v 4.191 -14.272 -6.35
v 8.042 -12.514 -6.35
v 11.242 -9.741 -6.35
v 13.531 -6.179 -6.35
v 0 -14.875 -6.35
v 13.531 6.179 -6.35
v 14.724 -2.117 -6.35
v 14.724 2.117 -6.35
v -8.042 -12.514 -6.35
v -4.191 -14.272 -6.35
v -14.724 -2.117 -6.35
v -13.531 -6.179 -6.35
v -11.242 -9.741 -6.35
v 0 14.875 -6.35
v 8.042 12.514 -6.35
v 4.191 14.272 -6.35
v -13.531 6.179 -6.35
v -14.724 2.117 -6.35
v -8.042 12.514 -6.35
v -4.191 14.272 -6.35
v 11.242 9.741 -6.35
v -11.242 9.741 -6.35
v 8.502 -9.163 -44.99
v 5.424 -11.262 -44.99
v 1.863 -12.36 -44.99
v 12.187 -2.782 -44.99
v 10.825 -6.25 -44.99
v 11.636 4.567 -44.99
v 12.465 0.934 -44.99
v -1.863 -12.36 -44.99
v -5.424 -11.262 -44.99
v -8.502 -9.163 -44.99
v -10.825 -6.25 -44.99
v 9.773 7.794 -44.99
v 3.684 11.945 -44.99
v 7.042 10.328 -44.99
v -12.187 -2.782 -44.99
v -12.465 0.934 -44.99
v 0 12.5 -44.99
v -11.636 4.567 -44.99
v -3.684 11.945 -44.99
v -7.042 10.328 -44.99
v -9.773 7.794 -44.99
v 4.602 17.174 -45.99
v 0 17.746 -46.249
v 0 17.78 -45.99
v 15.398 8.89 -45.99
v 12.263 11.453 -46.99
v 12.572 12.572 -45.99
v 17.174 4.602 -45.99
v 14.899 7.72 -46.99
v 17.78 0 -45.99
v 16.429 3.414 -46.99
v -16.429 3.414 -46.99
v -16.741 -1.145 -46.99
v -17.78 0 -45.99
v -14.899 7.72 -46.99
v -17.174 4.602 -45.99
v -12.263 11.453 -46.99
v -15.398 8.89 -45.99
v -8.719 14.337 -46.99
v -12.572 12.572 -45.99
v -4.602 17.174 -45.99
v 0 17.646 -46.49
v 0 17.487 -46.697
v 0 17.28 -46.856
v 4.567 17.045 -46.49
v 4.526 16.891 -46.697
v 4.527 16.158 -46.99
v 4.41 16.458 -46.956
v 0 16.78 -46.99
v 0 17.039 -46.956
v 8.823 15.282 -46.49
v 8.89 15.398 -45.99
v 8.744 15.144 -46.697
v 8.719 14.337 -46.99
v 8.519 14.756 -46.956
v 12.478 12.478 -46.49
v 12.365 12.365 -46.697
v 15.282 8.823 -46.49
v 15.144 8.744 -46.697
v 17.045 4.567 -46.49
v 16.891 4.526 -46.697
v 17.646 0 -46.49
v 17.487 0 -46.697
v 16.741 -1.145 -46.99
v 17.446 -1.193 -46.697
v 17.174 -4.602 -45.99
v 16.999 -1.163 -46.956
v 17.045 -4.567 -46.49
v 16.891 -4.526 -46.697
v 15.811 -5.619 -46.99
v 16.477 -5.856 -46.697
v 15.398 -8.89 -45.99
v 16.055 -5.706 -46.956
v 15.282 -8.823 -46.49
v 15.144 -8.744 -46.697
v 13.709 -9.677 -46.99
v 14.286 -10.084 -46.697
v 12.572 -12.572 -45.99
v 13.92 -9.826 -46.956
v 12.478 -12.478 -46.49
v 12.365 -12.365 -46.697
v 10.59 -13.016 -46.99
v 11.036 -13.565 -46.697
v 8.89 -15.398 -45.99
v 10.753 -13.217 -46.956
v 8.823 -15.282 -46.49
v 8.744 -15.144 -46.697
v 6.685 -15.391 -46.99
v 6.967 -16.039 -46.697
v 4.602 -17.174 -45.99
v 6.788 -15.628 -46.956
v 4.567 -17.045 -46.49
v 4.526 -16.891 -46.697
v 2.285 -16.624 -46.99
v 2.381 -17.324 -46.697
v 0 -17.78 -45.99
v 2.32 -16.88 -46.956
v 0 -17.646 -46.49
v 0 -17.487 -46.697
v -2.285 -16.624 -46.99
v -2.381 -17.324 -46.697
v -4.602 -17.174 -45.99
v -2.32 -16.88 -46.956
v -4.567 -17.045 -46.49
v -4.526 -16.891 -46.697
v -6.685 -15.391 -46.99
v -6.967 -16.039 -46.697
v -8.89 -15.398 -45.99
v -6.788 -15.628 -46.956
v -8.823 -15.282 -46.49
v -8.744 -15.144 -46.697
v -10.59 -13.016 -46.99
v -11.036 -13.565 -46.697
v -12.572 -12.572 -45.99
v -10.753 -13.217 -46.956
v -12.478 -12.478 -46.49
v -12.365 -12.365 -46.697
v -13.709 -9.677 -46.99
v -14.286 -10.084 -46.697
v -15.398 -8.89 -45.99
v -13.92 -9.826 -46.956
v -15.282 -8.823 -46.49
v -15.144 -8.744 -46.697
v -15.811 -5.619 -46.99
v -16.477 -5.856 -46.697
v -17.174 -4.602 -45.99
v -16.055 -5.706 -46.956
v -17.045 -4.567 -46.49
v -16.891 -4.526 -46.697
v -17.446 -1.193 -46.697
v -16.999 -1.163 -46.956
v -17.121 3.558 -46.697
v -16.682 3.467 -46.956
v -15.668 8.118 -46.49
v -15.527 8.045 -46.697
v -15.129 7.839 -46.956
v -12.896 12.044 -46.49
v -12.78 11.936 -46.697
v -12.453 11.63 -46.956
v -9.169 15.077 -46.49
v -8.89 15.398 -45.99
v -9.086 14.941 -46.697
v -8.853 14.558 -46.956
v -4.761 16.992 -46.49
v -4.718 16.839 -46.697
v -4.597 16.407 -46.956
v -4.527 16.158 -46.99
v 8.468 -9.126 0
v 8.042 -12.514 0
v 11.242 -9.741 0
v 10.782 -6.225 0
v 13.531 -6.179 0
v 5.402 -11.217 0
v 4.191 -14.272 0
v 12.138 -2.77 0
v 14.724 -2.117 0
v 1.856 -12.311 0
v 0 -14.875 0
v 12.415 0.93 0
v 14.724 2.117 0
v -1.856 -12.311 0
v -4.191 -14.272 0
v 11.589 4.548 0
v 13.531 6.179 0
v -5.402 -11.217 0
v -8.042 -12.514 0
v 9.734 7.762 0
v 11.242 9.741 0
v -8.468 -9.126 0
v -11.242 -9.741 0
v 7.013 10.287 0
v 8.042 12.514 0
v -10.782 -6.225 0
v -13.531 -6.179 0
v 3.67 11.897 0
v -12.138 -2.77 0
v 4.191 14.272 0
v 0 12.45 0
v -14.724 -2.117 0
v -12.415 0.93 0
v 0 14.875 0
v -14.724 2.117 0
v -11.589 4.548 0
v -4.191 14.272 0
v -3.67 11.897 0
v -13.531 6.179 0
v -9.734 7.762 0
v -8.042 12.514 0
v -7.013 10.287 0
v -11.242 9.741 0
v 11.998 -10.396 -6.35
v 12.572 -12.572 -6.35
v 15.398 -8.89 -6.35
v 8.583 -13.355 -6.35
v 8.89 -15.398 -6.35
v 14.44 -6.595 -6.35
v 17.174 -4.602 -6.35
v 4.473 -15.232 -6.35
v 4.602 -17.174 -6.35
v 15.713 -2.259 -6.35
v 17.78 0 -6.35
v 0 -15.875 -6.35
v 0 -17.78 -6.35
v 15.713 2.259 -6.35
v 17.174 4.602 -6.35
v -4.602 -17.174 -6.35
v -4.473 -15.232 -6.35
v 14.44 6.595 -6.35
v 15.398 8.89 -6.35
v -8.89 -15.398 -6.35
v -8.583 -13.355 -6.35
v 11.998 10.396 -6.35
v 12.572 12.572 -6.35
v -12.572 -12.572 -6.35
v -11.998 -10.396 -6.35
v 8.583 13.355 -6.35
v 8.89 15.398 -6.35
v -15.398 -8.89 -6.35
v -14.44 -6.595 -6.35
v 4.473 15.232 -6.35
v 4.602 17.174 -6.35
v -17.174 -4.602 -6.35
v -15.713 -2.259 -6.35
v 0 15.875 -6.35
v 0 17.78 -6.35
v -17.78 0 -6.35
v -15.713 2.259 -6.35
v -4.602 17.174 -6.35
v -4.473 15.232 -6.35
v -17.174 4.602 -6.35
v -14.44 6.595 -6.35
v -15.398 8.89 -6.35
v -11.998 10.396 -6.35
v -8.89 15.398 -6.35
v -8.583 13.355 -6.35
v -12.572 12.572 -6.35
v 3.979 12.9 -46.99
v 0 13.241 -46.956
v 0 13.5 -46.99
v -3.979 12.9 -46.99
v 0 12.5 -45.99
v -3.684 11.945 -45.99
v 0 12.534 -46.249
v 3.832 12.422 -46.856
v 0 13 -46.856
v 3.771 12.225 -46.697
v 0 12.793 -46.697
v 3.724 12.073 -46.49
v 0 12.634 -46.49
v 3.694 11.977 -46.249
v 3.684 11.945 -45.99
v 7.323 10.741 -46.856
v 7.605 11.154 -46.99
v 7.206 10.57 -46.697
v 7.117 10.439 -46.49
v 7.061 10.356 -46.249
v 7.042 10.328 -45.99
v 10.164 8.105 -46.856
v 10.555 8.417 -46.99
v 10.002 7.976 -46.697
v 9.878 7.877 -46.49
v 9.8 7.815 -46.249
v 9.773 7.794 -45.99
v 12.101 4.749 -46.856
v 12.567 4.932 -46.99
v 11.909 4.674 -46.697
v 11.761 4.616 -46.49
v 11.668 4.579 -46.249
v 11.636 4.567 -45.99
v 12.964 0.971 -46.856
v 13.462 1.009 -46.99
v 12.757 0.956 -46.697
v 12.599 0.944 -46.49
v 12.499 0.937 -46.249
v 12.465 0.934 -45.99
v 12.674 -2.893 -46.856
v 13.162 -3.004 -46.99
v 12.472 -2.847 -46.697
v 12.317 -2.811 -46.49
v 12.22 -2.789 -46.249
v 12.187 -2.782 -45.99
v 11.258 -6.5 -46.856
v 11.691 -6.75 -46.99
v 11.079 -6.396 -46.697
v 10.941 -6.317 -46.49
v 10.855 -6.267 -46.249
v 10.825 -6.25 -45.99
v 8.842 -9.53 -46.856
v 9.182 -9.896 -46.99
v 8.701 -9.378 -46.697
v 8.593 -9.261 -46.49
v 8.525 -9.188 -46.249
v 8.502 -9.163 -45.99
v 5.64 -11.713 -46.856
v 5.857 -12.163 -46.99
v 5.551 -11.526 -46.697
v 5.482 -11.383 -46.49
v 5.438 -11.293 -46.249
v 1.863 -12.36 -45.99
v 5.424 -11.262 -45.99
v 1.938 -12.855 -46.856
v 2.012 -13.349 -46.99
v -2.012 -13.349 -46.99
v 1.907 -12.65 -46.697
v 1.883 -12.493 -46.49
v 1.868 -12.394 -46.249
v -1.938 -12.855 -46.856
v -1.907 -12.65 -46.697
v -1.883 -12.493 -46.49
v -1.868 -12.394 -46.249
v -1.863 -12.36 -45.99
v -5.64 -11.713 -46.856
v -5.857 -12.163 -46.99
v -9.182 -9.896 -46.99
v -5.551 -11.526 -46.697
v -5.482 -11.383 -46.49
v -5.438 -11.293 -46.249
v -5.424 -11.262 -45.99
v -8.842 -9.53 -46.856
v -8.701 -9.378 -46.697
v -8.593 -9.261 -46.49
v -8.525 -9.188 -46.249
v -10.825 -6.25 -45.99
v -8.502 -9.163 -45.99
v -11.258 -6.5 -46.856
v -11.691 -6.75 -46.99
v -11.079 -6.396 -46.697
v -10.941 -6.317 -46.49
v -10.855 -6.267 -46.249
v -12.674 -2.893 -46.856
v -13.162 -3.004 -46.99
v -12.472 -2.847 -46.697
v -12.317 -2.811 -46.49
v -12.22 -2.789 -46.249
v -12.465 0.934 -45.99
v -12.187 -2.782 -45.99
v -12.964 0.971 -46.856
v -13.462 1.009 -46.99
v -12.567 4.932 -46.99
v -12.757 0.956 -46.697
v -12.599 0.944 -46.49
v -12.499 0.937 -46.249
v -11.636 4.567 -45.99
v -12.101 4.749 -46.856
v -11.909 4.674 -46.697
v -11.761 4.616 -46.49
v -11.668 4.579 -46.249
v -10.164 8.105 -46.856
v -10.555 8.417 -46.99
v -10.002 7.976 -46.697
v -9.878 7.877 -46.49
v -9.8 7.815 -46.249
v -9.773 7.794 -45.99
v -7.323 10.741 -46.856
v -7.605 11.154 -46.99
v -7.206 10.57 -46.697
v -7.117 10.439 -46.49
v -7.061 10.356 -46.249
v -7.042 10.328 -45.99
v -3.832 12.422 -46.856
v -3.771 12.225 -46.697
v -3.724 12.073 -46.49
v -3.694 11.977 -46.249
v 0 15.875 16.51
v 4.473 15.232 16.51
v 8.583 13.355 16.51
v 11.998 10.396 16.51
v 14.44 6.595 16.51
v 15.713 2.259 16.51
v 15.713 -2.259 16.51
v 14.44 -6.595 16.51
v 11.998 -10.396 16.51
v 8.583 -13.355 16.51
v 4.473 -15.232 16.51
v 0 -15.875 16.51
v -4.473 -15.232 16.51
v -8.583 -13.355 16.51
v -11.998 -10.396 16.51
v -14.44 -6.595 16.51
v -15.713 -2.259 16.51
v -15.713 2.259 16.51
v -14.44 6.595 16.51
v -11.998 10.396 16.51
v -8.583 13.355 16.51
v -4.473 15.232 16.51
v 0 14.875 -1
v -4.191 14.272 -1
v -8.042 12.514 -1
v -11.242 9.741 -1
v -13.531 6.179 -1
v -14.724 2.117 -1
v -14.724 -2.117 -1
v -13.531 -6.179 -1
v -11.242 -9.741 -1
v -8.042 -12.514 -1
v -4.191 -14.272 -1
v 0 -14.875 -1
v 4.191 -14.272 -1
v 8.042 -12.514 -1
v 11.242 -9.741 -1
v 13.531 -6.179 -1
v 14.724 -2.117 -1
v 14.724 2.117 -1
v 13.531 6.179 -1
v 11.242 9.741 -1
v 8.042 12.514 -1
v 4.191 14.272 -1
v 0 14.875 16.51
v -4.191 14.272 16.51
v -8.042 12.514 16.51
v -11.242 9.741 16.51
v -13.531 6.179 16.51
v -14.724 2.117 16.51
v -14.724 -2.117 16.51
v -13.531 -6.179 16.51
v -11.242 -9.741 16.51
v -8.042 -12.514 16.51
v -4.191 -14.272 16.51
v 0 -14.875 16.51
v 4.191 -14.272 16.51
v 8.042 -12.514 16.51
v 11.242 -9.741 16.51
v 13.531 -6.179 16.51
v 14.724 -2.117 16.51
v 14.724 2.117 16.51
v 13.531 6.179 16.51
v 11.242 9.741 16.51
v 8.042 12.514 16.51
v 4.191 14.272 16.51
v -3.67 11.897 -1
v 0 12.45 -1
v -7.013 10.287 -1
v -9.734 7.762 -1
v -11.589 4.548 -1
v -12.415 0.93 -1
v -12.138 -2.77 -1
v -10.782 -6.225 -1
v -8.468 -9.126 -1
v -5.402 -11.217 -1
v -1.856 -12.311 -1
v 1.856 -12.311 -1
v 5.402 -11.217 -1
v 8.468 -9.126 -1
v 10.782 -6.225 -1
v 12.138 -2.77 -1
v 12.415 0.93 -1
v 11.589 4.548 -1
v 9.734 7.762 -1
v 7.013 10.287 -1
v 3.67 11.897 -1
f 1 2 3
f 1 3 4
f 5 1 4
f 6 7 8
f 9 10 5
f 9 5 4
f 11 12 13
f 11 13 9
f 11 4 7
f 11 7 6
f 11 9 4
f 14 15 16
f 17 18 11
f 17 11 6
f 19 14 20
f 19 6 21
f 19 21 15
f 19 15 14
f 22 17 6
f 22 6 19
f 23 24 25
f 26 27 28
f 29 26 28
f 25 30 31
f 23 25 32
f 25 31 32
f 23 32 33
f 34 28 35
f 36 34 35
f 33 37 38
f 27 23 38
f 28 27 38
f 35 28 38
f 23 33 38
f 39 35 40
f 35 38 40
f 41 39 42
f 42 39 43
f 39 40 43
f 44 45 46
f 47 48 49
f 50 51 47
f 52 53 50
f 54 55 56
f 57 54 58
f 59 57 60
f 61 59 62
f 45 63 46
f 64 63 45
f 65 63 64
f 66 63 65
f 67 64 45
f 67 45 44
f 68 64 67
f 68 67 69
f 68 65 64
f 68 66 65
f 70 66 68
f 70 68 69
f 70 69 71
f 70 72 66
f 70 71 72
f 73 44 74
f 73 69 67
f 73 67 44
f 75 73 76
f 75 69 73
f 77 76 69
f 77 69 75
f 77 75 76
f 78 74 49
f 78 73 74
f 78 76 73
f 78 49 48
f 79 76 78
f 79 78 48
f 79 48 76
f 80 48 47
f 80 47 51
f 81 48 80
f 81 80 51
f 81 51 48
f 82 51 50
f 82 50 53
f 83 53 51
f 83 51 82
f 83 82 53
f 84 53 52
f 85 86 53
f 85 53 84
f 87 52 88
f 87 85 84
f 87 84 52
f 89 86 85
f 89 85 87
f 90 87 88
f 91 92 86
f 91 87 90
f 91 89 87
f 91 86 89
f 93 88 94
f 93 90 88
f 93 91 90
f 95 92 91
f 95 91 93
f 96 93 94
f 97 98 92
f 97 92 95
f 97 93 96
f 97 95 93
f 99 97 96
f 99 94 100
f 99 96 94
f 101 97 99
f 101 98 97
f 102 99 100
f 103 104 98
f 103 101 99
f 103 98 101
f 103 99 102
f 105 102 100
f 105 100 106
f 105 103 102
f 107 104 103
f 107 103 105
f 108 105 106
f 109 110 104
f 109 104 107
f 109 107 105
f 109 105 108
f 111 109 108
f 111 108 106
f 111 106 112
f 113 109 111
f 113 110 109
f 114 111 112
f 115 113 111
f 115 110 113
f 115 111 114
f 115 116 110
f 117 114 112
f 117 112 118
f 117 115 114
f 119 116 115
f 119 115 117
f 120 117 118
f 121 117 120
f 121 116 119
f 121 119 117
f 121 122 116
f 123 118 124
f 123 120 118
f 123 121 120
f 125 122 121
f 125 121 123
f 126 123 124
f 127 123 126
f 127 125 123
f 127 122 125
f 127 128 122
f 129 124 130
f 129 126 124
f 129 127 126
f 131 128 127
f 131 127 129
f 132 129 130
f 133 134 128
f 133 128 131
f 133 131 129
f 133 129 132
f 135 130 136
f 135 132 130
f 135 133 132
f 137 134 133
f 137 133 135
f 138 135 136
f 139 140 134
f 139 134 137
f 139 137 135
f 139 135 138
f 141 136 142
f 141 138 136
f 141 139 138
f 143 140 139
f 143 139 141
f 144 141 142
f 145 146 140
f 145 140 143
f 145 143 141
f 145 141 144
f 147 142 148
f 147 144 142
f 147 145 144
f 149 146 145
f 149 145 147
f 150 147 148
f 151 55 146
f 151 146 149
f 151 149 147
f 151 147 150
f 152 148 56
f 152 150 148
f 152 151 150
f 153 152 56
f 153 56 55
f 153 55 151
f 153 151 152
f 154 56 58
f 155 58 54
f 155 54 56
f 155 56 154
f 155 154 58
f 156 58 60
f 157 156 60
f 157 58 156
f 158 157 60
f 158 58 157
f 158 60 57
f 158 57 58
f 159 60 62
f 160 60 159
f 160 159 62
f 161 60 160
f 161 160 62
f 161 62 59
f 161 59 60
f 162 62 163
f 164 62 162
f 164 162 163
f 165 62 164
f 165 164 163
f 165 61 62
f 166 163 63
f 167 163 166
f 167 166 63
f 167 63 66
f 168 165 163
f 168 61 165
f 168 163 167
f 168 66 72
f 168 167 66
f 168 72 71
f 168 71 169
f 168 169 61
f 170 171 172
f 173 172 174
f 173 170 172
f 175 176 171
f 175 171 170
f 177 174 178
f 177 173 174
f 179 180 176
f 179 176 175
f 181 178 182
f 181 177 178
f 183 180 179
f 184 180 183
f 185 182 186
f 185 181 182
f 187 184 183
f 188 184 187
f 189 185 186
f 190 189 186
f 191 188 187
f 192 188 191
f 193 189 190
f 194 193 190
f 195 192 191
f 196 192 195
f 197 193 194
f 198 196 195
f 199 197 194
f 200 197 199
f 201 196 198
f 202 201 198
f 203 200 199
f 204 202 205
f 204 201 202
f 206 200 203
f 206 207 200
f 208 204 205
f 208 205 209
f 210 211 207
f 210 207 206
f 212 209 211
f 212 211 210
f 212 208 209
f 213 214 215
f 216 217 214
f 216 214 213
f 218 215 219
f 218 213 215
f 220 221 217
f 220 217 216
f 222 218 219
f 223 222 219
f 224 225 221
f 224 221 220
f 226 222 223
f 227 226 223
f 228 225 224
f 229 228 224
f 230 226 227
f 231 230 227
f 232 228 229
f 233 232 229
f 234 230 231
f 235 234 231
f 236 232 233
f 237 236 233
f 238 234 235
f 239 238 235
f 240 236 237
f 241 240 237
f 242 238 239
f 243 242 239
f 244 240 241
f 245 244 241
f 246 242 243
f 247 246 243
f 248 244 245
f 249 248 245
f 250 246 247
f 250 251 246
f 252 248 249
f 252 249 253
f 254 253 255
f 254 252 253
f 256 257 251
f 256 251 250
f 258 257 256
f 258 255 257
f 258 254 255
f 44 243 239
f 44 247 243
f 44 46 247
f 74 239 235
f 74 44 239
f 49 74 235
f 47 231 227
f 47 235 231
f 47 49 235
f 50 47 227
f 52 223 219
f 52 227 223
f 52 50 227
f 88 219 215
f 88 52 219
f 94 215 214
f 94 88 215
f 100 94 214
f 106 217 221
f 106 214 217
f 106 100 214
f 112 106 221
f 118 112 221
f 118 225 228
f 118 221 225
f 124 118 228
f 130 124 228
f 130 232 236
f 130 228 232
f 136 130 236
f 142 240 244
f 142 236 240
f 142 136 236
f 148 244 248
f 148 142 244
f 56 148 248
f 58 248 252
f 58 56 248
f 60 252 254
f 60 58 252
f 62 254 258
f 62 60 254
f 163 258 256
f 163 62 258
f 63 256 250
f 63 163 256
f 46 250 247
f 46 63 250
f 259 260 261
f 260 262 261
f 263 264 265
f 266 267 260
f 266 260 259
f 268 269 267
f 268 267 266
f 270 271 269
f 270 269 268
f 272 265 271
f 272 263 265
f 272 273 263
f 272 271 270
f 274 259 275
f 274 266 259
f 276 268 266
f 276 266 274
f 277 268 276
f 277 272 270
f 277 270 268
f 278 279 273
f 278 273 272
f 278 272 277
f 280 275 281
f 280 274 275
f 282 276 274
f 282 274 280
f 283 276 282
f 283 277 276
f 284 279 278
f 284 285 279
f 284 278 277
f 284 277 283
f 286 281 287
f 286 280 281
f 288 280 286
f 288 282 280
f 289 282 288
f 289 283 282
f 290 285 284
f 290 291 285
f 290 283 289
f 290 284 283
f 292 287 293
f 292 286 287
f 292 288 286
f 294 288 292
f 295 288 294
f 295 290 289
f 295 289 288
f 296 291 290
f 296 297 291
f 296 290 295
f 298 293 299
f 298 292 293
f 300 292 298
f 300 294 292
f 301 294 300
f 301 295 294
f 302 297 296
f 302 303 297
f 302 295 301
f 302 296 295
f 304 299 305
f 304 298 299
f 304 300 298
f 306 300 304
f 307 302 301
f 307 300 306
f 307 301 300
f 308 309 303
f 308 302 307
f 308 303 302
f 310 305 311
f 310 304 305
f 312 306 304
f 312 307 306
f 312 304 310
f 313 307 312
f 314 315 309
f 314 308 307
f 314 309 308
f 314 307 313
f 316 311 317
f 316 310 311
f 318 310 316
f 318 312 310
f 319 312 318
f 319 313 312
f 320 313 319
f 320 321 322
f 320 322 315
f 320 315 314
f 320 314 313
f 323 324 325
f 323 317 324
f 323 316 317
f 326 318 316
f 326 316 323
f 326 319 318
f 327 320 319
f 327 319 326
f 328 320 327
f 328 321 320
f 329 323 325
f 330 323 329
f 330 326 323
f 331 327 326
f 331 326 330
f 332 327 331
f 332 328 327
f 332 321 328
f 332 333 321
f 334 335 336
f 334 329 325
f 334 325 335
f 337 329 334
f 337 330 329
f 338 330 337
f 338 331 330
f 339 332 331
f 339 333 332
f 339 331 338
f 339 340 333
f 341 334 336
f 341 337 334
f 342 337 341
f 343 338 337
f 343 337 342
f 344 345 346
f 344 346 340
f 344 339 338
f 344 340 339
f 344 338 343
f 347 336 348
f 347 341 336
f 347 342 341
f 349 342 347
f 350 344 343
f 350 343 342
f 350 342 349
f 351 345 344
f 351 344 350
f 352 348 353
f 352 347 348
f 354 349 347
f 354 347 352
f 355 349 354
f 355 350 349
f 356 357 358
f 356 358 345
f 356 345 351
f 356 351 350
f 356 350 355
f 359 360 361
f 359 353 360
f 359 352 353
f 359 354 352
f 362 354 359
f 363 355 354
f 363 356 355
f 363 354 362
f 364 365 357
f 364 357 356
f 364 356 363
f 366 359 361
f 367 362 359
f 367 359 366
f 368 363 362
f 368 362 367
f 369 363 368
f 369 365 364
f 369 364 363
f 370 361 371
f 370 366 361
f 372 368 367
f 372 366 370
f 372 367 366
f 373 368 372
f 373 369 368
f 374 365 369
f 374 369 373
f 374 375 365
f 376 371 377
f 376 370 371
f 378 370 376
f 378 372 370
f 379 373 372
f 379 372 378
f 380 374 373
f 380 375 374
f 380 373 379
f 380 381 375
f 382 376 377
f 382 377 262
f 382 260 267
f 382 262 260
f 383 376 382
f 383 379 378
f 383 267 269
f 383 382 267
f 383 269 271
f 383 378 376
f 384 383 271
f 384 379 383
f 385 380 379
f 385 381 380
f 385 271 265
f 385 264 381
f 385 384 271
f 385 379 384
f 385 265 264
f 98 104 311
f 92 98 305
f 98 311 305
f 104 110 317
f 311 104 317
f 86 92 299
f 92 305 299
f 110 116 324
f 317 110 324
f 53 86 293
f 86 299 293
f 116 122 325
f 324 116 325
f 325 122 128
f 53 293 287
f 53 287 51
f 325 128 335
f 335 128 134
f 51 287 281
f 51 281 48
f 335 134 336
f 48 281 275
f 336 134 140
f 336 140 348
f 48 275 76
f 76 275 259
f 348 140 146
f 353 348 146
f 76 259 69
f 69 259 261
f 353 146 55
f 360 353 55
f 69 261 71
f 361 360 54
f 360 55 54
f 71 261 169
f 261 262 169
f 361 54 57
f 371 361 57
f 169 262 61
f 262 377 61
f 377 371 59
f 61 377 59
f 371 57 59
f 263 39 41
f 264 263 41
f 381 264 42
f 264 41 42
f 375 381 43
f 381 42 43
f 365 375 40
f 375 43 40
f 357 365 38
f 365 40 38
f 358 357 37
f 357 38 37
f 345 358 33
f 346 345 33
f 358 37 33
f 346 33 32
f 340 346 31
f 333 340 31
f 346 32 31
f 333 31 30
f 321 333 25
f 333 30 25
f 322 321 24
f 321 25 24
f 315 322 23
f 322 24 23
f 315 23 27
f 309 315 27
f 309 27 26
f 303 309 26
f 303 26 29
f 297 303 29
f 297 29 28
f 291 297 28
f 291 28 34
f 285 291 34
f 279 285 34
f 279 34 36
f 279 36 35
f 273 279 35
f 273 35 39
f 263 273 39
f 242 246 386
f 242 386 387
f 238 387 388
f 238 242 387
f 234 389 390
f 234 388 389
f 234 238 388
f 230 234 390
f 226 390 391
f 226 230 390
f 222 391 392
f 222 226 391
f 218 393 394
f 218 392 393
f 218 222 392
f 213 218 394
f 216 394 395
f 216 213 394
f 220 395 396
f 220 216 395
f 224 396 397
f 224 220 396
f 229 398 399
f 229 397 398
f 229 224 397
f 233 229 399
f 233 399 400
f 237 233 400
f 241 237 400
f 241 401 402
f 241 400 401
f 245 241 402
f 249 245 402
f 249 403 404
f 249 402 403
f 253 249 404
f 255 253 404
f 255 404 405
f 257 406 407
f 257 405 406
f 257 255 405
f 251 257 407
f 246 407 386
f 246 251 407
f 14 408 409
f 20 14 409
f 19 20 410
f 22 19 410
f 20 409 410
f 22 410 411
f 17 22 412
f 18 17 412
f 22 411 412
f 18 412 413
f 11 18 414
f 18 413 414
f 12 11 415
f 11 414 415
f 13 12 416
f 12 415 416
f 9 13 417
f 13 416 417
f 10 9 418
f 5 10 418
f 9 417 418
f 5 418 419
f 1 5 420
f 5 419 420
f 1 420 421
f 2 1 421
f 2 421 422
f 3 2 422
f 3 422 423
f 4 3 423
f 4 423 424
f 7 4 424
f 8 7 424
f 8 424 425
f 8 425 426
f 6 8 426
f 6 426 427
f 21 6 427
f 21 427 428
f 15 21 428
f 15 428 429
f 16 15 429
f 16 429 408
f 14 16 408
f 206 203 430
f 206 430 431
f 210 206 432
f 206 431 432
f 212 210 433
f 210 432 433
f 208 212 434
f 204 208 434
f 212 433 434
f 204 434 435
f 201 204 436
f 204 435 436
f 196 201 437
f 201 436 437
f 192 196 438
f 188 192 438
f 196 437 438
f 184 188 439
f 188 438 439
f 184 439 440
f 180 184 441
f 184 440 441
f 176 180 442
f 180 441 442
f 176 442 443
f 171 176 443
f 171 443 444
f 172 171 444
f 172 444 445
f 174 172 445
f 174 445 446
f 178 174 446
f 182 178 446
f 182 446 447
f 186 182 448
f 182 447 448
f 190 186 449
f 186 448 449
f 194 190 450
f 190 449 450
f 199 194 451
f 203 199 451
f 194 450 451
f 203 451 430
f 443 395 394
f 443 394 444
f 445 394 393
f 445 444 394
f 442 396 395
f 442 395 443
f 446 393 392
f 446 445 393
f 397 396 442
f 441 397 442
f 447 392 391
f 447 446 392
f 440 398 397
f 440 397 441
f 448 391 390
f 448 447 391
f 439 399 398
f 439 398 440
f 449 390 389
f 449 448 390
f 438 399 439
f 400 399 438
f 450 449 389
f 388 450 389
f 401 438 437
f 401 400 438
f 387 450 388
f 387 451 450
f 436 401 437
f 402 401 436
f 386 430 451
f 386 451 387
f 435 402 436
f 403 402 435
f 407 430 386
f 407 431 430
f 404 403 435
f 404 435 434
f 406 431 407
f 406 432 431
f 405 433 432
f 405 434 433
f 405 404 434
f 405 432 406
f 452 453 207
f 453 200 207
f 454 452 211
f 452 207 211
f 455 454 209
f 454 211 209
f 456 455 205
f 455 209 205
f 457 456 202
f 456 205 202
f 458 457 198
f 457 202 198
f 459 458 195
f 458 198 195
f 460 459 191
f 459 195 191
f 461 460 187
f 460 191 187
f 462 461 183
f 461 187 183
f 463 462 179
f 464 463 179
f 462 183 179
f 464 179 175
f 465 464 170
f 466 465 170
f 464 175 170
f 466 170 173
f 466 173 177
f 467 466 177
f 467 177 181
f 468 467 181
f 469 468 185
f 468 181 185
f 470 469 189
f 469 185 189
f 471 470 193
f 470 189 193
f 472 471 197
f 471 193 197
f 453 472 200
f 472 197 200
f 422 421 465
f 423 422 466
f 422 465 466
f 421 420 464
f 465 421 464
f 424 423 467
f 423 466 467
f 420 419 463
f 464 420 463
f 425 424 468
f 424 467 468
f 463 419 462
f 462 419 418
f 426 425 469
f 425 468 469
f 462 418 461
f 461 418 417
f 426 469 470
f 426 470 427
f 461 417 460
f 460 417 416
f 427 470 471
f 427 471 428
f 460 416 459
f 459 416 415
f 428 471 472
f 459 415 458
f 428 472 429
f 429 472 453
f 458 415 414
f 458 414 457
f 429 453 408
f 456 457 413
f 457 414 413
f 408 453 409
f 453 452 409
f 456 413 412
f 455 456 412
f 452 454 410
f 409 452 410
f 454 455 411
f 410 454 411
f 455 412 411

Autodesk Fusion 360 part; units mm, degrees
sketch "Sketch1" plane through (0, 0, 0) normal (1, 0, 0) x (0, 0, -1)
  line L0 (0, 12.45) -> (0, 14.875)
  line L1 (0, 14.875) -> (-16.51, 14.875)
  line L2 (-16.51, 14.875) -> (-16.51, 15.875)
  line L3 (-16.51, 15.875) -> (6.35, 15.875)
  line L4 (6.35, 15.875) -> (6.35, 17.78)
  line L5 (6.35, 17.78) -> (46.99, 17.78)
  line L6 (46.99, 17.78) -> (46.99, 12.5)
  line L7 (46.99, 12.5) -> (44.99, 12.5)
  line L8 (44.99, 12.5) -> (44.99, 0)
  line L9 (44.99, 0) -> (6.35, 0)
  line L10 (6.35, 0) -> (6.35, 14.875)
  line L11 (6.35, 14.875) -> (1, 14.875)
  line L12 (1, 14.875) -> (1, 12.45)
  line L13 (1, 12.45) -> (0, 12.45)
  dimension "d532" = 15.875
  dimension "d533" = 1
  dimension "d534" = 12.45
  dimension "d535" = 14.875
  dimension "d536" = 5.35
  dimension "d537" = 16.51
  dimension "d538" = 17.78
  dimension "d539" = 40.64
  dimension "d540" = 12.5
  dimension "d541" = 2
  dimension "d545" = 0
  dimension "d546" = 0
  dimension "d547" = 0
  dimension "d548" = 0
revolve "Revolve1" add sketch "Sketch1" angle 360 about axis through (0, 0, 1.75) along (0, 0, 1)
fillet "Fillet1" radius 1 2 edges at (-16.5768, 6.4295, -46.99) (-11.6541, 4.5202, -46.99)
equation "d532 = 1.25 in / 2"
properties part number "Eyepiece"
